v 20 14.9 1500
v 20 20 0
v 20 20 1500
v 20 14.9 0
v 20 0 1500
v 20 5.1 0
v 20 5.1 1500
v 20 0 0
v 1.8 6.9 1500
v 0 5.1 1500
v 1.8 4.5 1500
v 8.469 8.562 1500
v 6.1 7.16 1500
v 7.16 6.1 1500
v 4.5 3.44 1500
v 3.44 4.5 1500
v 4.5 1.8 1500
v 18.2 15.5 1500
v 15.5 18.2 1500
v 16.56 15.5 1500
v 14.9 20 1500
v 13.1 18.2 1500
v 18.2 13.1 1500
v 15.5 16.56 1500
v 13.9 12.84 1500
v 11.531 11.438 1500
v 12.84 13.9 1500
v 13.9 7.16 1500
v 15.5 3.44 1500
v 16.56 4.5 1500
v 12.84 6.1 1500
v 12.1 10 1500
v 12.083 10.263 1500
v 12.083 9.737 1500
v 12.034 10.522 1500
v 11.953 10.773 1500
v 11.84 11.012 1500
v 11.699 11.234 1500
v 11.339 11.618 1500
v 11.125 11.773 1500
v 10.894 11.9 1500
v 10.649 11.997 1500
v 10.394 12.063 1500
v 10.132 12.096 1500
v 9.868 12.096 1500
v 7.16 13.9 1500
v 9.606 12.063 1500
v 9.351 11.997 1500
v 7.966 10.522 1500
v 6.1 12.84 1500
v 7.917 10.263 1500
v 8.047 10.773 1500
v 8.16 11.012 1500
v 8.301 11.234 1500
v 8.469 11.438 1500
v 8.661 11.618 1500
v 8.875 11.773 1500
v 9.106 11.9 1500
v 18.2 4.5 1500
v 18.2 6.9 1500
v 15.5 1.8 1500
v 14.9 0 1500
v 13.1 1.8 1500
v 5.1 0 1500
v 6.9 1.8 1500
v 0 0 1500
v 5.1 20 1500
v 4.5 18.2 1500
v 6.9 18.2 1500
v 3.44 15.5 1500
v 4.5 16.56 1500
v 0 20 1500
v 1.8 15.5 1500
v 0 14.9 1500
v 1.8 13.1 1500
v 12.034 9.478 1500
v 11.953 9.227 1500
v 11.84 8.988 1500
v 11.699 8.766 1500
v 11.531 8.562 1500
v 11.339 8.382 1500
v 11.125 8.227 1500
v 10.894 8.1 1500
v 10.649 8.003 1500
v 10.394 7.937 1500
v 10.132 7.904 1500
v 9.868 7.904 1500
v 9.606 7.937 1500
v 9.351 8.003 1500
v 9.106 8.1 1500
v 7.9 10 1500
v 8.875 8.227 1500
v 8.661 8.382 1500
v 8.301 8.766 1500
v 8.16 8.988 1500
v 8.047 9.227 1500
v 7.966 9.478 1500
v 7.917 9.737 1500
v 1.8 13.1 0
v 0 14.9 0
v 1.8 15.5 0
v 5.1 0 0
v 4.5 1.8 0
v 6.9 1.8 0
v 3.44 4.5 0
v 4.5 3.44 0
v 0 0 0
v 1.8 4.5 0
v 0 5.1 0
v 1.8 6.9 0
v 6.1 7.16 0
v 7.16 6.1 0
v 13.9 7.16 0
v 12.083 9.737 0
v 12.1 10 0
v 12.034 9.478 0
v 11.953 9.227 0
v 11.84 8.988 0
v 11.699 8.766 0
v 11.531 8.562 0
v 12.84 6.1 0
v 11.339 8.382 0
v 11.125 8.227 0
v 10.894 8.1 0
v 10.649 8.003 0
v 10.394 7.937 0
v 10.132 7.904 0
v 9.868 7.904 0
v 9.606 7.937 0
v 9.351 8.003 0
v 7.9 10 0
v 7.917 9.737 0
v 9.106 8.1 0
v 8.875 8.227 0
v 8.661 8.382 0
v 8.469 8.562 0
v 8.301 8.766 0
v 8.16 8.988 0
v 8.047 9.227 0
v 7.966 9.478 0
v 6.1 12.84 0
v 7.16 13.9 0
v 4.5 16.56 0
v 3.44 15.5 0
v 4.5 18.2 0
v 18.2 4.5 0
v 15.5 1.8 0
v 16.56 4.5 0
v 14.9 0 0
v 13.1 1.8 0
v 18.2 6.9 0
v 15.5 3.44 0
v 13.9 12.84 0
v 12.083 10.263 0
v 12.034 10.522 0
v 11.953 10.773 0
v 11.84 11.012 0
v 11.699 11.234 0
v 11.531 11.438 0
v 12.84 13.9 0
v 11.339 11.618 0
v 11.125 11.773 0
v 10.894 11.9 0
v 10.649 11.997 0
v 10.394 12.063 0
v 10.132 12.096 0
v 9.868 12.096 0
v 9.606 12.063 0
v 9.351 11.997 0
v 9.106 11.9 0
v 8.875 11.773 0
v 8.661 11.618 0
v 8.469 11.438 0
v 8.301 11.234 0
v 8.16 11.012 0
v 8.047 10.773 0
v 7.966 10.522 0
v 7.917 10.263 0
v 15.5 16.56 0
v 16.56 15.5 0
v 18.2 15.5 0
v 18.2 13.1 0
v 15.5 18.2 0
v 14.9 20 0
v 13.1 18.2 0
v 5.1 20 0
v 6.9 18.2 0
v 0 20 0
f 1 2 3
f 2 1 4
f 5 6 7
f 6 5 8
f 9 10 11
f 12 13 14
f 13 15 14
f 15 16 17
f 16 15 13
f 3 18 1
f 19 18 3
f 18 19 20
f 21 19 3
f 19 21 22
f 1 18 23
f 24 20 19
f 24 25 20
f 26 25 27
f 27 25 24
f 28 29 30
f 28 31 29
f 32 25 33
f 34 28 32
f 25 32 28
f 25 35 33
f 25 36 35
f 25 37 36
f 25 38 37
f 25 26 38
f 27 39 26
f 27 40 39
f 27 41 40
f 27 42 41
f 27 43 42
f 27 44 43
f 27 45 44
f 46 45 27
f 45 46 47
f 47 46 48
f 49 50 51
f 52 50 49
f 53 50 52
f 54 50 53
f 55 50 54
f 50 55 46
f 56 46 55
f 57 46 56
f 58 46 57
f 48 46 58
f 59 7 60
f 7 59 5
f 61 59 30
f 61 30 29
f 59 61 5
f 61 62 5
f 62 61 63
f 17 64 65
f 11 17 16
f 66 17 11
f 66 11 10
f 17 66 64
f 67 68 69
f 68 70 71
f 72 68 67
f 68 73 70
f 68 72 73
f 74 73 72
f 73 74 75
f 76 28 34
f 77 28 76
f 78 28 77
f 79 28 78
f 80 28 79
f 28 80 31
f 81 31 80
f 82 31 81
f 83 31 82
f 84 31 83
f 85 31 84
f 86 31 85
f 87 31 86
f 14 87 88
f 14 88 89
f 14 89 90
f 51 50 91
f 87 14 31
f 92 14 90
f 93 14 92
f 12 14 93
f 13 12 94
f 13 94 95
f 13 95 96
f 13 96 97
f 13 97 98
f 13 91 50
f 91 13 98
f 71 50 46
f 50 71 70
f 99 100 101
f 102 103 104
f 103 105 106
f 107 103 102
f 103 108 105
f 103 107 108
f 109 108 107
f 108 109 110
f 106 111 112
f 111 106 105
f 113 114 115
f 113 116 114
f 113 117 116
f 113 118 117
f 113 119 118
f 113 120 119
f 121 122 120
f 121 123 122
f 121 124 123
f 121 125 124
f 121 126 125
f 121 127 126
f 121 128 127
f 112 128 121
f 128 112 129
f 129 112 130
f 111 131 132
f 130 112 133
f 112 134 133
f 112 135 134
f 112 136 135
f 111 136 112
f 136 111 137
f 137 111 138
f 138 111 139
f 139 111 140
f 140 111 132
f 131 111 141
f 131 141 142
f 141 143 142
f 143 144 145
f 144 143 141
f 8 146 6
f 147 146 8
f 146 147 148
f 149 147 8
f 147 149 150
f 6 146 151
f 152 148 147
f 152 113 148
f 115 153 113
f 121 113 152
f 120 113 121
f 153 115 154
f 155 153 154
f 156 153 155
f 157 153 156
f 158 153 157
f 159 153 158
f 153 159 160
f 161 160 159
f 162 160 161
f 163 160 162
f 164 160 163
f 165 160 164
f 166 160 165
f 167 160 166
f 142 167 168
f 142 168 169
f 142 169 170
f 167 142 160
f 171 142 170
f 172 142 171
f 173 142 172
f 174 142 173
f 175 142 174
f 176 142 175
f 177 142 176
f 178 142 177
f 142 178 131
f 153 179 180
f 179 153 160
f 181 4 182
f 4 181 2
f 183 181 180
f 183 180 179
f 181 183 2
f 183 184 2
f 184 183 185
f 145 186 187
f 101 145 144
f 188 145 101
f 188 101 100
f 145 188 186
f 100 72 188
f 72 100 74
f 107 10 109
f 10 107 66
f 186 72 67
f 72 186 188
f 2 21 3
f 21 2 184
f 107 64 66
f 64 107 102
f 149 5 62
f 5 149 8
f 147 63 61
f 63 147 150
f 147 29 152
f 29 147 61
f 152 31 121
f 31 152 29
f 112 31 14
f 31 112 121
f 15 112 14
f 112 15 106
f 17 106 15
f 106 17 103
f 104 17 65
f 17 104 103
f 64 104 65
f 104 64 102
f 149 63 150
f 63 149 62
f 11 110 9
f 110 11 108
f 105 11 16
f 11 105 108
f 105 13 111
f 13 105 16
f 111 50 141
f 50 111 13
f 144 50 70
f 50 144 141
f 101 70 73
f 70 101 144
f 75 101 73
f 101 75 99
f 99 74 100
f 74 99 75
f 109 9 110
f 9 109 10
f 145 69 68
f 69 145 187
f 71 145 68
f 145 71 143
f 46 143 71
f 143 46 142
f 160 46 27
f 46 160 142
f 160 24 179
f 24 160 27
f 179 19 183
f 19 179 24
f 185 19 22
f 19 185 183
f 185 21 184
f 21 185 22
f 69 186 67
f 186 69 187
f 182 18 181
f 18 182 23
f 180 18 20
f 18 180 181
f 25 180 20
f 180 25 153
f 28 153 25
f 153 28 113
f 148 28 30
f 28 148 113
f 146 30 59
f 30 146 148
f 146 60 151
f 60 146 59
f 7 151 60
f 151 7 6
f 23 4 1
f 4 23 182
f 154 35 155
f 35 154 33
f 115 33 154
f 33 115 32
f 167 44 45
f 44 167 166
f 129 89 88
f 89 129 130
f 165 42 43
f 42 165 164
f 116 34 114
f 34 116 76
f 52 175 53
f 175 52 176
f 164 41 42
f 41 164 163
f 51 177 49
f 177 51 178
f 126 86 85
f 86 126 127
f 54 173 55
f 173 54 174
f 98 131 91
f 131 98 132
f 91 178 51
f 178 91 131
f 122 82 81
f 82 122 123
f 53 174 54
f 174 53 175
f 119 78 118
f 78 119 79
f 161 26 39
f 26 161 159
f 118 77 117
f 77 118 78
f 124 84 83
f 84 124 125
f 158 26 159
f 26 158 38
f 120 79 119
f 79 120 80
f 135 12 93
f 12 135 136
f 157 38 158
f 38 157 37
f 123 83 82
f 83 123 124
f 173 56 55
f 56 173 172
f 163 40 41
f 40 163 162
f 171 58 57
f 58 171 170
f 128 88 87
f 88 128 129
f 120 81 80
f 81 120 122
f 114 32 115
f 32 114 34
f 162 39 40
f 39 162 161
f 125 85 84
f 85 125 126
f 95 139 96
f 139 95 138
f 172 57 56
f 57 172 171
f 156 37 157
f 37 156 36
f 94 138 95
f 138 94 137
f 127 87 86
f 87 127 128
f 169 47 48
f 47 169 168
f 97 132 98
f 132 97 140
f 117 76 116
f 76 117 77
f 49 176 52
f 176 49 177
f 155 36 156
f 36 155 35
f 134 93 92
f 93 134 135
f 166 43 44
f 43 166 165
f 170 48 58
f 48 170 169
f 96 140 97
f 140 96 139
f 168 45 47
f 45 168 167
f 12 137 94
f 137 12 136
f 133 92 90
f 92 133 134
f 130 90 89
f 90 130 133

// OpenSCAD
// Generated by SolidPython 1.1.3 on 2022-04-28 23:56:22


difference() {
	cube(size = [20.0000000000, 20.0000000000, 1500]);
	translate(v = [5.1000000000, 0, 0]) {
		linear_extrude(center = false, convexity = 10, height = 1500, twist = 0) {
			polygon(points = [[0.0000000000, 0.0000000000], [1.8000000000, 1.8000000000], [-0.6000000000, 1.8000000000], [-0.6000000000, 3.4400000000], [2.0600000000, 6.1000000000], [7.7400000000, 6.1000000000], [10.4000000000, 3.4400000000], [10.4000000000, 1.8000000000], [8, 1.8000000000], [9.8000000000, 0.0000000000], [0.0000000000, 0.0000000000]]);
		}
	}
	translate(v = [0, 14.9000000000, 0]) {
		rotate(a = [0, 0, 270]) {
			linear_extrude(center = false, convexity = 10, height = 1500, twist = 0) {
				polygon(points = [[0.0000000000, 0.0000000000], [1.8000000000, 1.8000000000], [-0.6000000000, 1.8000000000], [-0.6000000000, 3.4400000000], [2.0600000000, 6.1000000000], [7.7400000000, 6.1000000000], [10.4000000000, 3.4400000000], [10.4000000000, 1.8000000000], [8, 1.8000000000], [9.8000000000, 0.0000000000], [0.0000000000, 0.0000000000]]);
			}
		}
	}
	translate(v = [14.9000000000, 0, 0]) {
		translate(v = [0, 20.0000000000, 0]) {
			rotate(a = [0, 0, 180]) {
				linear_extrude(center = false, convexity = 10, height = 1500, twist = 0) {
					polygon(points = [[0.0000000000, 0.0000000000], [1.8000000000, 1.8000000000], [-0.6000000000, 1.8000000000], [-0.6000000000, 3.4400000000], [2.0600000000, 6.1000000000], [7.7400000000, 6.1000000000], [10.4000000000, 3.4400000000], [10.4000000000, 1.8000000000], [8, 1.8000000000], [9.8000000000, 0.0000000000], [0.0000000000, 0.0000000000]]);
				}
			}
		}
	}
	translate(v = [20.0000000000, 0, 0]) {
		translate(v = [0, 5.1000000000, 0]) {
			rotate(a = [0, 0, 90]) {
				linear_extrude(center = false, convexity = 10, height = 1500, twist = 0) {
					polygon(points = [[0.0000000000, 0.0000000000], [1.8000000000, 1.8000000000], [-0.6000000000, 1.8000000000], [-0.6000000000, 3.4400000000], [2.0600000000, 6.1000000000], [7.7400000000, 6.1000000000], [10.4000000000, 3.4400000000], [10.4000000000, 1.8000000000], [8, 1.8000000000], [9.8000000000, 0.0000000000], [0.0000000000, 0.0000000000]]);
				}
			}
		}
	}
	translate(v = [0, 10.0000000000, 0]) {
		translate(v = [10.0000000000, 0, 0]) {
			cylinder($fn = 50, h = 1500, r = 2.1000000000);
		}
	}
}
/***********************************************
*********      SolidPython code:      **********
************************************************
 
from solid import *
from solid.utils import *  # Not required, but the utils module is useful

GROOVE_WIDTH = 9.8

def make_groove(height):
    # Define the shape of the vslot grooves as a polygon.
    groove_points = [
        [0.0, 0.0, 0.0],
        [1.8, 1.8, 0.0],
        [-0.6, 1.8, 0.0],
        [-0.6, 3.44, 0.0],
        [2.06, 6.1, 0.0],
        [7.74, 6.1, 0.0],
        [10.4, 3.44, 0.0],
        [10.4, 1.8, 0.0],
        [8, 1.8, 0.0],
        [9.8, 0.0, 0.0],
        [0.0, 0.0, 0.0],
    ];

    # Extrude the groove polygon into a 3d object.
    return linear_extrude(height = height, center = False, convexity = 10, twist = 0)(
        polygon(groove_points)
    );

def make_2020(height):
    # Overall dimensions
    side = 20.0;

    translate_dist = (side/2) - (GROOVE_WIDTH/2);

    bottom_groove = right(translate_dist)(
        make_groove(height)
    );

    left_groove = forward(translate_dist + GROOVE_WIDTH)(
        rotate([0, 0, 270])(
            make_groove(height)
        )
    );

    top_groove = right(translate_dist + GROOVE_WIDTH)(
        forward(side)(
            rotate([0, 0, 180])(
                make_groove(height)
            )
        )
    );
    
    right_groove = right(side)(
        forward(translate_dist)(
            rotate([0, 0, 90])(
                make_groove(height)
            )
        )
    );

    center_hole = forward(side/2)(
        right(side/2)(
            cylinder(h=height, r=2.1, segments=50)
        )
    );

    return cube([side, side, height]) - bottom_groove - left_groove - top_groove - right_groove - center_hole;

# Test renders
scad_render_to_file(make_2020(250), '../../scad/vslot2020_250mm.scad');
scad_render_to_file(make_2020(500), '../../scad/vslot2020_500mm.scad');
scad_render_to_file(make_2020(1000), '../../scad/vslot2020_1000mm.scad');
scad_render_to_file(make_2020(1500), '../../scad/vslot2020_1500mm.scad');
scad_render_to_file(make_2020(2000), '../../scad/vslot2020_2000mm.scad');
scad_render_to_file(make_groove(250), '../../scad/vslotgroove.scad'); 
 
************************************************/
